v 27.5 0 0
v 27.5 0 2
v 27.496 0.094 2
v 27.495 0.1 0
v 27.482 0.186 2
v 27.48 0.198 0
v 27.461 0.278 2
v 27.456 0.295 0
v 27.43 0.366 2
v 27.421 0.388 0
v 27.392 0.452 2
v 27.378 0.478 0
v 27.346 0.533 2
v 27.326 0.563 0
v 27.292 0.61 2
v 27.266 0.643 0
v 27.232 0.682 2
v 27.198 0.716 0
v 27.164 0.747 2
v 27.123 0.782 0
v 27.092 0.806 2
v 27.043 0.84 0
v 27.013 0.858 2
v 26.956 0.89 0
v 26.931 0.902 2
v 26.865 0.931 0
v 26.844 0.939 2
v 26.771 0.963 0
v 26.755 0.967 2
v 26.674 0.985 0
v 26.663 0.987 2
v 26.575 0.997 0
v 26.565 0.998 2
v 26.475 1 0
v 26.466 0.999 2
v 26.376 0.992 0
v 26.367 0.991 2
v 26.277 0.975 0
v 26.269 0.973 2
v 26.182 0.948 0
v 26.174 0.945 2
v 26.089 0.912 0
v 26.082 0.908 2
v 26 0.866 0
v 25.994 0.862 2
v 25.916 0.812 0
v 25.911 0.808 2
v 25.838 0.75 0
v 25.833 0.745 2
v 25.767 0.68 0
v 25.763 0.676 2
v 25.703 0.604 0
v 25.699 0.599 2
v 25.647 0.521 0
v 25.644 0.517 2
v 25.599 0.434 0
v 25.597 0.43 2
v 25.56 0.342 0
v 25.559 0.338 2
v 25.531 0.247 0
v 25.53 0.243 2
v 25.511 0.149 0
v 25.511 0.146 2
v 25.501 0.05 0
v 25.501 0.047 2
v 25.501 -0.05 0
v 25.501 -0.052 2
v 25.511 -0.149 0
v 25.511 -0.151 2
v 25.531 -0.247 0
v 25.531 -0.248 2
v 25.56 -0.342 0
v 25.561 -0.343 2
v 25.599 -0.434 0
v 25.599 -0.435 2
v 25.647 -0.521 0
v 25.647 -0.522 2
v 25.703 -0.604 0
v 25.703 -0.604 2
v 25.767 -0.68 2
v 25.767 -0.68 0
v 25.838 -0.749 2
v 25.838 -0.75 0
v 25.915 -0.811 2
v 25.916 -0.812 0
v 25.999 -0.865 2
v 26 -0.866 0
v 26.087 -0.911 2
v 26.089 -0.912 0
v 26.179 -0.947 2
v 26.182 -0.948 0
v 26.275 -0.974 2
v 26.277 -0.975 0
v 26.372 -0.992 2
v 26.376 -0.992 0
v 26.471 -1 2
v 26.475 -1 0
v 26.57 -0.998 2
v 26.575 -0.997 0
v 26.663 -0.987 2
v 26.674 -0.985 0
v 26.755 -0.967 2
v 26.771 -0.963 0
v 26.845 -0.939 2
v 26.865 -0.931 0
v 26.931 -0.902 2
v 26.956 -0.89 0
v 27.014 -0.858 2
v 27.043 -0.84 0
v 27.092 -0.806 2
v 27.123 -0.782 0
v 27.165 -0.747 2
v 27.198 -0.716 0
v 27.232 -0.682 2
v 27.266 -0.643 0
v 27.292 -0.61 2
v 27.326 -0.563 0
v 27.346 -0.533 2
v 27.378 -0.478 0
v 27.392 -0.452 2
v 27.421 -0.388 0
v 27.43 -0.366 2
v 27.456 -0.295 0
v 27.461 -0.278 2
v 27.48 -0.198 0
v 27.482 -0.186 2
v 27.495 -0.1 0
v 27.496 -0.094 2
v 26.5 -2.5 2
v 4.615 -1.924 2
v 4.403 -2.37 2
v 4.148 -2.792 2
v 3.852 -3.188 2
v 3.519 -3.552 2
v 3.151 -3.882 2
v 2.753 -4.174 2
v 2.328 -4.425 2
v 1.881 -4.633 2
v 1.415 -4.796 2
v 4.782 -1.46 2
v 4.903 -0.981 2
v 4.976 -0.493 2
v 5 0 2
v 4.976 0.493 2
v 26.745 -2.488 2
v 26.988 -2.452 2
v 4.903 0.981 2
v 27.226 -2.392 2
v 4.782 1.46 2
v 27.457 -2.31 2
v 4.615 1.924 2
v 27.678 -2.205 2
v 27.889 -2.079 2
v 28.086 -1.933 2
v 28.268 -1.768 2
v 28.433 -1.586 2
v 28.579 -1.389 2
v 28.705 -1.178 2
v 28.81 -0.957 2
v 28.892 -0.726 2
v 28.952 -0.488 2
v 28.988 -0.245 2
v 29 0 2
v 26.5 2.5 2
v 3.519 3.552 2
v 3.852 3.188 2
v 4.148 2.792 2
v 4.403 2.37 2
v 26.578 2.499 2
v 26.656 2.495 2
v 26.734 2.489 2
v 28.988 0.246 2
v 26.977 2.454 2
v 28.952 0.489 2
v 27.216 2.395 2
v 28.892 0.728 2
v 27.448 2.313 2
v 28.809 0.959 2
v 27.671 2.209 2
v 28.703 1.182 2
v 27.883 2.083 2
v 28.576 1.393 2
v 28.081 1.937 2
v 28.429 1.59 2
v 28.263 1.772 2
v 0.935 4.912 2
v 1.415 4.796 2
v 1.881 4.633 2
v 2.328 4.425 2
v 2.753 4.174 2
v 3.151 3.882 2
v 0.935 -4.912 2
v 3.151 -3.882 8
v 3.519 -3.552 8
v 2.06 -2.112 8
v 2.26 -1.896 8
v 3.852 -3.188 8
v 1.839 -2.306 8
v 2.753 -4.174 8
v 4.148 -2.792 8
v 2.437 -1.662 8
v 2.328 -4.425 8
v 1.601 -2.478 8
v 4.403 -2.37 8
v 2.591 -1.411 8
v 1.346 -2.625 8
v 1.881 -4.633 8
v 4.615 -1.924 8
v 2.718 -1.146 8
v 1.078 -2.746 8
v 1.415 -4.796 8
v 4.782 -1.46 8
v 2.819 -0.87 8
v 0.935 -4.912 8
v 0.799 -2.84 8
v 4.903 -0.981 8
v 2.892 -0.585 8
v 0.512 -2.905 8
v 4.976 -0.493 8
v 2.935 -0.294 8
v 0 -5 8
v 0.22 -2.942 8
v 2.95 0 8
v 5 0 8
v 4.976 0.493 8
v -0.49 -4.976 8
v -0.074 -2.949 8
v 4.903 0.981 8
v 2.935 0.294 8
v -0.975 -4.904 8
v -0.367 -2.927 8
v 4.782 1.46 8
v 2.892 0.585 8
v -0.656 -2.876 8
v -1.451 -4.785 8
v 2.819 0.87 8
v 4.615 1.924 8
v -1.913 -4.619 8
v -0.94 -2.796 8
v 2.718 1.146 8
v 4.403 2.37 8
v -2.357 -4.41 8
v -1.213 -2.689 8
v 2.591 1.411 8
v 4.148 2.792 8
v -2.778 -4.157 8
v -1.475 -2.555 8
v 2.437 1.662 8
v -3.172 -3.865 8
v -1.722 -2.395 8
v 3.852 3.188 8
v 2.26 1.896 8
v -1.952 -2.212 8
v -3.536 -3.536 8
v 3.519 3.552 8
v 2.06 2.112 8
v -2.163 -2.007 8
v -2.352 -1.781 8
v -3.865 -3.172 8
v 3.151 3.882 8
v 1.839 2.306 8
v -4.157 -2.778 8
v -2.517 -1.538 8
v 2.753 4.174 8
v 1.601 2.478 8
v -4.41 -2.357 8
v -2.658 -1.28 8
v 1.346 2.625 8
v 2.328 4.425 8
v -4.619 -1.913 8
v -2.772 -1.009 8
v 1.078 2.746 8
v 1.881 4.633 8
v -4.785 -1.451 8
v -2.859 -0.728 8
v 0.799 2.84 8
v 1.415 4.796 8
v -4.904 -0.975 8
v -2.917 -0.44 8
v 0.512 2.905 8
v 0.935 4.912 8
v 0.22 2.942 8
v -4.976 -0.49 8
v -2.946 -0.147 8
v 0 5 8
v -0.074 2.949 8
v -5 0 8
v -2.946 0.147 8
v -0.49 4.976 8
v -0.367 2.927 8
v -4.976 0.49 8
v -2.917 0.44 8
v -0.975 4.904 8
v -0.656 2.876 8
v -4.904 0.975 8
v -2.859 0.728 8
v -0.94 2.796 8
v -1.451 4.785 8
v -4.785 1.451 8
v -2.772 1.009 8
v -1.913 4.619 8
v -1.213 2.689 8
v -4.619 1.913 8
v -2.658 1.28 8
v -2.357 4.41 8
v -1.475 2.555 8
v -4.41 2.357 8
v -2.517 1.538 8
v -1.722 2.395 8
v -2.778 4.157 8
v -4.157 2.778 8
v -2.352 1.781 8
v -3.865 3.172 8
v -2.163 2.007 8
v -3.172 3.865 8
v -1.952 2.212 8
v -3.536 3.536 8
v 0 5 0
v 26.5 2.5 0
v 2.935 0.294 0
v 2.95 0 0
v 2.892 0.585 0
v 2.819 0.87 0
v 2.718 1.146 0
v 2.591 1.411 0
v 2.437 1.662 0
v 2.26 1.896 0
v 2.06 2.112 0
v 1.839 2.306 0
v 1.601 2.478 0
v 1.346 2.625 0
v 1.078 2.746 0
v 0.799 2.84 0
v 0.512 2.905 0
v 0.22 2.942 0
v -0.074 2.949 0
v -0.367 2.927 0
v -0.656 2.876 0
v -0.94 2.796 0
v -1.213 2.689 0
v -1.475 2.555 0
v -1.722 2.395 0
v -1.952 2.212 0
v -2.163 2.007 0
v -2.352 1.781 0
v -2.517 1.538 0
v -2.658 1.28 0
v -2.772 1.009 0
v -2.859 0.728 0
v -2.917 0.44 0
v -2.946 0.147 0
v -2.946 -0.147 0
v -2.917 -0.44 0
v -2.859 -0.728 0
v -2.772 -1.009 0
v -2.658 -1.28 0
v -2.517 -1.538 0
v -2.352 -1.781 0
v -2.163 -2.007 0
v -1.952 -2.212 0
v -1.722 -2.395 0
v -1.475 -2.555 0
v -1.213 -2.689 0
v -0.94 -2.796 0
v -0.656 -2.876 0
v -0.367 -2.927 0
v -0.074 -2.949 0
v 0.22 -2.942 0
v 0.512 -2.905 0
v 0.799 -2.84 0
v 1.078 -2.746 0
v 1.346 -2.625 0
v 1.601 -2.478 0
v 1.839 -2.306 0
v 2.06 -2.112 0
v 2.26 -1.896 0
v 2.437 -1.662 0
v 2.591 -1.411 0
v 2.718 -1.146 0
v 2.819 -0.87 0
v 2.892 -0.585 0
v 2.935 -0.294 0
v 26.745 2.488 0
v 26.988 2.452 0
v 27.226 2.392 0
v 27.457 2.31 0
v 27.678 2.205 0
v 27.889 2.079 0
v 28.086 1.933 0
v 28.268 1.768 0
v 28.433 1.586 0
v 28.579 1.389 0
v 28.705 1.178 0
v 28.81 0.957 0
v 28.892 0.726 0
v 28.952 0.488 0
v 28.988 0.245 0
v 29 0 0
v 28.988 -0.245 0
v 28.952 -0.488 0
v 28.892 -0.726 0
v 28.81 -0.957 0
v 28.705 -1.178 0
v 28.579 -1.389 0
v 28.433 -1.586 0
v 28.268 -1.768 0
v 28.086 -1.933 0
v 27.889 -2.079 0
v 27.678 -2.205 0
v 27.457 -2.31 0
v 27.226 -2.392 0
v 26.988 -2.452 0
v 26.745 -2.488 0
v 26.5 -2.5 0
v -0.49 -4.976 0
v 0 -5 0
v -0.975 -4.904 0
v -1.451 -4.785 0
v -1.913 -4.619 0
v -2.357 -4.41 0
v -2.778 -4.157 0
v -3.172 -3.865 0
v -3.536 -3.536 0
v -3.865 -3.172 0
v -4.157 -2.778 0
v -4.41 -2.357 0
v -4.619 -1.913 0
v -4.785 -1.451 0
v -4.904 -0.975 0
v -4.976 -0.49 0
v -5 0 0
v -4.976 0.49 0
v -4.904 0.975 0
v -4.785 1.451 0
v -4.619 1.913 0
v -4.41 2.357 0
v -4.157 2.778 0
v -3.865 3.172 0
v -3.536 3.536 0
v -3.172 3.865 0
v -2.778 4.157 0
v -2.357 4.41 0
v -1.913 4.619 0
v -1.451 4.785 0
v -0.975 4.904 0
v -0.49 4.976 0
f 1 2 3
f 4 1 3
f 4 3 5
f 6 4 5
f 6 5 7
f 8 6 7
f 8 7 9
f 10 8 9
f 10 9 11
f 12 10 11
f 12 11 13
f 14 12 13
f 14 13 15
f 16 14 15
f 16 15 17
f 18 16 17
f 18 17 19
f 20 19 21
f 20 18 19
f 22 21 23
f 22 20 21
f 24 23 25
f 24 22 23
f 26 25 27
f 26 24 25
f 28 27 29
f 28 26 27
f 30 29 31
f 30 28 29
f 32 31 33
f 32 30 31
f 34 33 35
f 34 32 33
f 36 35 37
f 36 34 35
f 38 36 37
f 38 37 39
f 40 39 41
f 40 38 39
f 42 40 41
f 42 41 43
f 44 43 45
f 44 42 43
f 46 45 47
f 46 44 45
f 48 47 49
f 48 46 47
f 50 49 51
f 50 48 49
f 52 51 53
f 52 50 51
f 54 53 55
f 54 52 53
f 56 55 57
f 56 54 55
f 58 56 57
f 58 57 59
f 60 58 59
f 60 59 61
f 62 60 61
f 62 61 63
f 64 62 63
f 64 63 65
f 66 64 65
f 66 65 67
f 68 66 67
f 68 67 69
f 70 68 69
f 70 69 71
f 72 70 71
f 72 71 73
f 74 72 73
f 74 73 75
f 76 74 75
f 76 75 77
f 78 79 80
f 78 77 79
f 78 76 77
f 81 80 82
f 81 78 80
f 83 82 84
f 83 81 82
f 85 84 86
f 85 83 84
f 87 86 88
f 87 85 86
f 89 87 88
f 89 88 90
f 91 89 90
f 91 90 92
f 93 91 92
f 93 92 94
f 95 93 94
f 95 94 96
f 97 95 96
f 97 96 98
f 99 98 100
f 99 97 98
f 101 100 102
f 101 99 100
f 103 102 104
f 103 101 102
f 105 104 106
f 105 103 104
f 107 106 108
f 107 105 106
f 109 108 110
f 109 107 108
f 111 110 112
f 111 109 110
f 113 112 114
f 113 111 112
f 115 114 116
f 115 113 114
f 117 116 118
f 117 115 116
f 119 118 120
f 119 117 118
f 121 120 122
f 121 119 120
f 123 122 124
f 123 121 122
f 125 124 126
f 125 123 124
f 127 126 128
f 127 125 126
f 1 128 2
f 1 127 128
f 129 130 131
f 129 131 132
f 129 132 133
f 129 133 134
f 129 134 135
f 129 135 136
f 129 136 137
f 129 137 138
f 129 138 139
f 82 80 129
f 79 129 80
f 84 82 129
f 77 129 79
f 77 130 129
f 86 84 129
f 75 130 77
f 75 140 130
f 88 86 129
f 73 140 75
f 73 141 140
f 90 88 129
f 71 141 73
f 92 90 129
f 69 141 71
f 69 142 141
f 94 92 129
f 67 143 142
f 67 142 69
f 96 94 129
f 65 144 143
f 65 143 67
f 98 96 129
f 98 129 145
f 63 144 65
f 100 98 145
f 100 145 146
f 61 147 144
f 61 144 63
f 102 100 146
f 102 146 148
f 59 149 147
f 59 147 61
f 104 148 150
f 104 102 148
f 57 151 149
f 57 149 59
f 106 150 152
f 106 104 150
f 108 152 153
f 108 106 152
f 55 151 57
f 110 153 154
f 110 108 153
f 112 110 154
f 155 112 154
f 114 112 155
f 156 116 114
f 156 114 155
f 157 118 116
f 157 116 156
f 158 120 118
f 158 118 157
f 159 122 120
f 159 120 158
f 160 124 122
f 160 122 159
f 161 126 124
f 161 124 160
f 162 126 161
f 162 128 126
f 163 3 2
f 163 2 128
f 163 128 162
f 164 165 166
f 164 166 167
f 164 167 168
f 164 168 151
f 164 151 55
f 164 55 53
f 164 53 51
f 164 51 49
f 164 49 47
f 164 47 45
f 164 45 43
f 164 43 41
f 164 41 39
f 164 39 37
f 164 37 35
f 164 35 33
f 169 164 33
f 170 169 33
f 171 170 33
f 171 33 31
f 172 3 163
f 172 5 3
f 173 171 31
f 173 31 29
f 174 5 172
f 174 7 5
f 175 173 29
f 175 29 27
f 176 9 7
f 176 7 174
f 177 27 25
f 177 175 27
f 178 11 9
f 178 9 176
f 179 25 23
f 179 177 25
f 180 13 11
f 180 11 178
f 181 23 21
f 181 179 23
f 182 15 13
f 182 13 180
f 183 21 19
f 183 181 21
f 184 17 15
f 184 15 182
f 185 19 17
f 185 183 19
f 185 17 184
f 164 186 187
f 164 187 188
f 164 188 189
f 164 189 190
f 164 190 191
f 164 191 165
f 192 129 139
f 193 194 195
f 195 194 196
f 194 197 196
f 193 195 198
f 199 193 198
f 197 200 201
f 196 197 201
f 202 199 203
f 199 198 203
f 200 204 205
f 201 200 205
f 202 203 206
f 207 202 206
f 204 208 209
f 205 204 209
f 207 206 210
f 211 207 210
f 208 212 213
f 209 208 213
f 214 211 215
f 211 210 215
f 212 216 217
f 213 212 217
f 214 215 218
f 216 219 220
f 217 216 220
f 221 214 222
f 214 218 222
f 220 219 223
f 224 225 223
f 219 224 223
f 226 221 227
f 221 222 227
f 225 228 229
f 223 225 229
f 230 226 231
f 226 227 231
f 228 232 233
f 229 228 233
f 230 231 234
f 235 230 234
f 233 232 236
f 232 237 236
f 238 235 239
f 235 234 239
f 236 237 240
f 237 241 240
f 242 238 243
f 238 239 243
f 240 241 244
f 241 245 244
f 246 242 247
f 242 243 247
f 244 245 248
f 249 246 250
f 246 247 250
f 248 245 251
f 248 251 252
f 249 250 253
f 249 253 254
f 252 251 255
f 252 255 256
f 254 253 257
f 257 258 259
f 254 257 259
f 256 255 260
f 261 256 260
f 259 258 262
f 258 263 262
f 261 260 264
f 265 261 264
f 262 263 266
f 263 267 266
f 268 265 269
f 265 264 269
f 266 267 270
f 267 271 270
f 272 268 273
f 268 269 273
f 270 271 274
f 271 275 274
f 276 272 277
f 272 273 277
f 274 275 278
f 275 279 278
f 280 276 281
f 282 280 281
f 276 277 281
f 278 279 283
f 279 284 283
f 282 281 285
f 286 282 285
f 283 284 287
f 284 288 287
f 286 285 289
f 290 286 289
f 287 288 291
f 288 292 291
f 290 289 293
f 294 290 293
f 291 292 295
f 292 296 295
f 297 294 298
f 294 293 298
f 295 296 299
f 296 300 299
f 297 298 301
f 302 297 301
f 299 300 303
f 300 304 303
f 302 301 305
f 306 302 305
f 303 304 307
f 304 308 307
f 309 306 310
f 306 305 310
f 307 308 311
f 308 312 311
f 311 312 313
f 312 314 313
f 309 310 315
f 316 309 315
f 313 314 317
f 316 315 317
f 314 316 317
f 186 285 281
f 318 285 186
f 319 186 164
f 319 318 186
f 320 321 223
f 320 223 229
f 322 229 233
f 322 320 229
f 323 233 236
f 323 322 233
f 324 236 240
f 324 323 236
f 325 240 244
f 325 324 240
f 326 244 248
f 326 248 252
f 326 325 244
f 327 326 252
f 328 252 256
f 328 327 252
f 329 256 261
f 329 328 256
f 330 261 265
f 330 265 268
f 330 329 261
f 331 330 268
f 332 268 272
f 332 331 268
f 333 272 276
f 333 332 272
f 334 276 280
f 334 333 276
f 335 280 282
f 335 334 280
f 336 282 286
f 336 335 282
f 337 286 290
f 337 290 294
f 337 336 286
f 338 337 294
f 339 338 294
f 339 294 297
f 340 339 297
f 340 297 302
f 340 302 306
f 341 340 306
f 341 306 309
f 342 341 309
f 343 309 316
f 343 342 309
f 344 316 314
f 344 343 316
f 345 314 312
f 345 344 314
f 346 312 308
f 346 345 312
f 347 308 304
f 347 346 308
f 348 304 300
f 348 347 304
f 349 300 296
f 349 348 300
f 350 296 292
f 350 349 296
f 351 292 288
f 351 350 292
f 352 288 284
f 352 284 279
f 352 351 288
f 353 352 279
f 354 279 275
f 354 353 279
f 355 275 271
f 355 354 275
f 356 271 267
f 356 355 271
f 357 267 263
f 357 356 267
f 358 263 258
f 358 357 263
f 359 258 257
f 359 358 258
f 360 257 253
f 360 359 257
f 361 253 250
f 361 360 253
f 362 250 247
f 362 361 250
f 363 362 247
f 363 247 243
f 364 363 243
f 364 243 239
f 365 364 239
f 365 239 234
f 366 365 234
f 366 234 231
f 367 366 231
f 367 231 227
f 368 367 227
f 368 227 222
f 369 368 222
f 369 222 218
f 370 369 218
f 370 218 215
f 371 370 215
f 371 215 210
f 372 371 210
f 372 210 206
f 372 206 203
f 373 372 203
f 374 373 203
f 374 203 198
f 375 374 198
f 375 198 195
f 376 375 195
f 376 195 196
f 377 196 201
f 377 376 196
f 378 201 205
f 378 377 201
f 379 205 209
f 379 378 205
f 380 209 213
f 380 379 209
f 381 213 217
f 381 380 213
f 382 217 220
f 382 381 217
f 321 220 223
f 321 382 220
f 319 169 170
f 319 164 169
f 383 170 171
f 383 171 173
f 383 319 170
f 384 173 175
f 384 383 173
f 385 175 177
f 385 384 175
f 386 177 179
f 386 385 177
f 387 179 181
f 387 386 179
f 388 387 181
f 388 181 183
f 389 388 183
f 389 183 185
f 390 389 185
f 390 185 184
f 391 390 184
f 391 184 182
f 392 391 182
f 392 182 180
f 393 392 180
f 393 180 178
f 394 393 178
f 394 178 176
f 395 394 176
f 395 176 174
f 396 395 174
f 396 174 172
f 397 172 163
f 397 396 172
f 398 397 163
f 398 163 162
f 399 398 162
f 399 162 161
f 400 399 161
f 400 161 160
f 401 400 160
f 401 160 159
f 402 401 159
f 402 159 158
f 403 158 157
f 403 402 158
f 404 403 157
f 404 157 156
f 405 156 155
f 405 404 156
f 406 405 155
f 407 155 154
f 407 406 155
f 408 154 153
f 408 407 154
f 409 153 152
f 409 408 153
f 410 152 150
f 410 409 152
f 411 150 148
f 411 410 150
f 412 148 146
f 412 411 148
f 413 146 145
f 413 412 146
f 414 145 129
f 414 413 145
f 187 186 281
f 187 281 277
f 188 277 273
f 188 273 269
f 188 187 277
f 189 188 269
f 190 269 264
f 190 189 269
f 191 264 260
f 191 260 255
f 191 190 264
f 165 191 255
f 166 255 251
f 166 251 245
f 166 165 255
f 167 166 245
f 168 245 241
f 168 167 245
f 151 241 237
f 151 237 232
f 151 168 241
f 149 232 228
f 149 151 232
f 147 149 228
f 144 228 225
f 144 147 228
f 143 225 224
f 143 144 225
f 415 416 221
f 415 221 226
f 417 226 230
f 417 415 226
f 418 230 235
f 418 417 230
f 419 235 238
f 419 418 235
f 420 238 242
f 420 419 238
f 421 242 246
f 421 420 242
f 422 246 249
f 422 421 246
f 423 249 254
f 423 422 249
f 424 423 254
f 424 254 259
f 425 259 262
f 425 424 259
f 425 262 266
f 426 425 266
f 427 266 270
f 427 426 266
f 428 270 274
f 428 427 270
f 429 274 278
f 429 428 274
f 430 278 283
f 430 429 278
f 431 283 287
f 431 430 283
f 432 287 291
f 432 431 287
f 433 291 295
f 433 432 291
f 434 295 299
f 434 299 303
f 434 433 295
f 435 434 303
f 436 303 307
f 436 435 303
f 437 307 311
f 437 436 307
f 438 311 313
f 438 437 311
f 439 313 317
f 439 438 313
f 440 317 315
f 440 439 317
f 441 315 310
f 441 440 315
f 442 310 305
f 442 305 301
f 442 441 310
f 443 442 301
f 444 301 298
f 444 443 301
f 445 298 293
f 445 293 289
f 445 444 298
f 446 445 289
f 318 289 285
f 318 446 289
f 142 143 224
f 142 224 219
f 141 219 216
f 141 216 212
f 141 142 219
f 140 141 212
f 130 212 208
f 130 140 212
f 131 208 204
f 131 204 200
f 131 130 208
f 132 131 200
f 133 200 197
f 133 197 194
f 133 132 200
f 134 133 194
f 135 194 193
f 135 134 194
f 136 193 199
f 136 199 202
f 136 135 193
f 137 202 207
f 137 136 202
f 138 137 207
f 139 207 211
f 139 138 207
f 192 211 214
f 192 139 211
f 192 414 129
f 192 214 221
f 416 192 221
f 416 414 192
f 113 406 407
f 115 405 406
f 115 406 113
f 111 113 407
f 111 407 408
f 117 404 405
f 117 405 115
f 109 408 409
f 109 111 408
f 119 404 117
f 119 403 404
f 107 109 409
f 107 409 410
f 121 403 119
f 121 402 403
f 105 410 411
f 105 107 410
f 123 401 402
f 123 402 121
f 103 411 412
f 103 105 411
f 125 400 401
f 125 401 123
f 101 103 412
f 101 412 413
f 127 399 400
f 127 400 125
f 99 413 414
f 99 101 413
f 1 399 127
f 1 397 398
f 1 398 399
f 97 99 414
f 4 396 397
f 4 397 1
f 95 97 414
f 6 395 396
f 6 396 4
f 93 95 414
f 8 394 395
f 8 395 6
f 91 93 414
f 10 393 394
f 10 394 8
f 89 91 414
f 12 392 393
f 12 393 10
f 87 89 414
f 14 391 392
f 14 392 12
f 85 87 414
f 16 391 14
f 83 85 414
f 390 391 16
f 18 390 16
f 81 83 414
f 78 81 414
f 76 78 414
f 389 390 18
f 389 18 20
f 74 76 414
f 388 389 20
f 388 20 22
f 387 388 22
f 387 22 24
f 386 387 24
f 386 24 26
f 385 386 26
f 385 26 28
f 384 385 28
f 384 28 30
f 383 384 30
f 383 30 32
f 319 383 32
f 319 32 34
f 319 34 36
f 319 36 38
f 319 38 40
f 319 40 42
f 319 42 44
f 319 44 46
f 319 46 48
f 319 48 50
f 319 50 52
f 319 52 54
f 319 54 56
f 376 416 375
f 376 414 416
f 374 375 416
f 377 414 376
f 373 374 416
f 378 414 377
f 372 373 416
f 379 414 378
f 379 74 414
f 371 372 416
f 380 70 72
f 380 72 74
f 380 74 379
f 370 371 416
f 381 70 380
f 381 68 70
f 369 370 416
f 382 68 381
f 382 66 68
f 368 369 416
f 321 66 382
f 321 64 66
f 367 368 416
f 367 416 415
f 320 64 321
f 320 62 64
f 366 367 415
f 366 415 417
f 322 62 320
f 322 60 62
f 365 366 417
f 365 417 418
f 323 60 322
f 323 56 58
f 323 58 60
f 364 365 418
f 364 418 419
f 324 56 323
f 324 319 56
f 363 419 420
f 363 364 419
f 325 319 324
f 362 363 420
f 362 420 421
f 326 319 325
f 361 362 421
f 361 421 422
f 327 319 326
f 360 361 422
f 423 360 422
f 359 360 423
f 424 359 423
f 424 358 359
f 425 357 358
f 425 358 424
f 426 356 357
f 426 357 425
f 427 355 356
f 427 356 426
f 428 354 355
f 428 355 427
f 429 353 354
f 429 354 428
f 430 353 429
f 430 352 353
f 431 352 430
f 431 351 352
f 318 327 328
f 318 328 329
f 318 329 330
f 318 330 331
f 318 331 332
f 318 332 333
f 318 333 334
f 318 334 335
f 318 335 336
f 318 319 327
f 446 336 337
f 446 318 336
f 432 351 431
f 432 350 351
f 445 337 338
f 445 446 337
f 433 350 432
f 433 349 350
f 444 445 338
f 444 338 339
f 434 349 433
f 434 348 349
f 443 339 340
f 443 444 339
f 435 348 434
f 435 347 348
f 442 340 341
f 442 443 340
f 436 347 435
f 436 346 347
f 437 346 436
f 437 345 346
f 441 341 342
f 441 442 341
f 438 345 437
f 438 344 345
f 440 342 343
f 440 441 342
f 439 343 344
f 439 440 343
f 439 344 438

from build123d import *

# Parameters (mm, degrees)
ESQUISSE1_R             = 2.95
ESQUISSE1_R_2           = 1
BOSS_EXTRU_1_DEPTH      = 8
ENL_V_START             = -6
ENL_V_MAT_EXTRU_1_DEPTH = 6


with BuildPart() as part:
    # Esquisse1 → Boss.-Extru.1 (new body)
    with BuildSketch(Plane.XY):
        with BuildLine():
            Line((0, 5), (26.5, 2.5))
            ThreePointArc((26.5, 2.5), (29, 0), (26.5, -2.5))
            Line((26.5, -2.5), (0, -5))
            ThreePointArc((0, -5), (-5, 0), (0, 5))
        make_face()
        Circle(ESQUISSE1_R, mode=Mode.SUBTRACT)
        with Locations((26.5, 0)):
            Circle(ESQUISSE1_R_2, mode=Mode.SUBTRACT)
    extrude(amount=BOSS_EXTRU_1_DEPTH)

    # Esquisse2 → Enlèv. mat.-Extru.1 (cut)
    with BuildSketch(Plane.XY.offset(8).offset(ENL_V_START)):
        with BuildLine():
            Line((26.5, 2.5), (0.9350741, 4.911785462))
            ThreePointArc((0.9350741, 4.911785462), (3.851971606, 3.18783857), (5, 0))
            ThreePointArc((5, 0), (3.851971606, -3.18783857), (0.9350741, -4.911785462))
            Line((0.9350741, -4.911785462), (26.5, -2.5))
            ThreePointArc((26.5, -2.5), (24, 0), (26.5, 2.5))
        make_face()
        with BuildLine():
            ThreePointArc((29, 0), (28.348574488, 1.683084182), (26.73378211, 2.489045183))
            Line((26.73378211, 2.489045183), (26.663377196, 0.986563679))
            ThreePointArc((26.663377196, 0.986563679), (27.262685124, 0.646769976), (27.5, 0))
            ThreePointArc((27.5, 0), (27.231575326, -0.68176062), (26.570404914, -0.997518495))
            Line((26.570404914, -0.997518495), (26.5, -2.5))
            ThreePointArc((26.5, -2.5), (28.267766953, -1.767766953), (29, 0))
        make_face()
        with BuildLine():
            Line((26.663377196, 0.986563679), (26.73378211, 2.489045183))
            ThreePointArc((26.73378211, 2.489045183), (26.617019318, 2.497259794), (26.5, 2.5))
            ThreePointArc((26.5, 2.5), (24, 0), (26.5, -2.5))
            Line((26.5, -2.5), (26.570404914, -0.997518495))
            ThreePointArc((26.570404914, -0.997518495), (25.501096082, 0.046807727), (26.663377196, 0.986563679))
        make_face()
    extrude(amount=ENL_V_MAT_EXTRU_1_DEPTH, mode=Mode.SUBTRACT)


solid = part.part
